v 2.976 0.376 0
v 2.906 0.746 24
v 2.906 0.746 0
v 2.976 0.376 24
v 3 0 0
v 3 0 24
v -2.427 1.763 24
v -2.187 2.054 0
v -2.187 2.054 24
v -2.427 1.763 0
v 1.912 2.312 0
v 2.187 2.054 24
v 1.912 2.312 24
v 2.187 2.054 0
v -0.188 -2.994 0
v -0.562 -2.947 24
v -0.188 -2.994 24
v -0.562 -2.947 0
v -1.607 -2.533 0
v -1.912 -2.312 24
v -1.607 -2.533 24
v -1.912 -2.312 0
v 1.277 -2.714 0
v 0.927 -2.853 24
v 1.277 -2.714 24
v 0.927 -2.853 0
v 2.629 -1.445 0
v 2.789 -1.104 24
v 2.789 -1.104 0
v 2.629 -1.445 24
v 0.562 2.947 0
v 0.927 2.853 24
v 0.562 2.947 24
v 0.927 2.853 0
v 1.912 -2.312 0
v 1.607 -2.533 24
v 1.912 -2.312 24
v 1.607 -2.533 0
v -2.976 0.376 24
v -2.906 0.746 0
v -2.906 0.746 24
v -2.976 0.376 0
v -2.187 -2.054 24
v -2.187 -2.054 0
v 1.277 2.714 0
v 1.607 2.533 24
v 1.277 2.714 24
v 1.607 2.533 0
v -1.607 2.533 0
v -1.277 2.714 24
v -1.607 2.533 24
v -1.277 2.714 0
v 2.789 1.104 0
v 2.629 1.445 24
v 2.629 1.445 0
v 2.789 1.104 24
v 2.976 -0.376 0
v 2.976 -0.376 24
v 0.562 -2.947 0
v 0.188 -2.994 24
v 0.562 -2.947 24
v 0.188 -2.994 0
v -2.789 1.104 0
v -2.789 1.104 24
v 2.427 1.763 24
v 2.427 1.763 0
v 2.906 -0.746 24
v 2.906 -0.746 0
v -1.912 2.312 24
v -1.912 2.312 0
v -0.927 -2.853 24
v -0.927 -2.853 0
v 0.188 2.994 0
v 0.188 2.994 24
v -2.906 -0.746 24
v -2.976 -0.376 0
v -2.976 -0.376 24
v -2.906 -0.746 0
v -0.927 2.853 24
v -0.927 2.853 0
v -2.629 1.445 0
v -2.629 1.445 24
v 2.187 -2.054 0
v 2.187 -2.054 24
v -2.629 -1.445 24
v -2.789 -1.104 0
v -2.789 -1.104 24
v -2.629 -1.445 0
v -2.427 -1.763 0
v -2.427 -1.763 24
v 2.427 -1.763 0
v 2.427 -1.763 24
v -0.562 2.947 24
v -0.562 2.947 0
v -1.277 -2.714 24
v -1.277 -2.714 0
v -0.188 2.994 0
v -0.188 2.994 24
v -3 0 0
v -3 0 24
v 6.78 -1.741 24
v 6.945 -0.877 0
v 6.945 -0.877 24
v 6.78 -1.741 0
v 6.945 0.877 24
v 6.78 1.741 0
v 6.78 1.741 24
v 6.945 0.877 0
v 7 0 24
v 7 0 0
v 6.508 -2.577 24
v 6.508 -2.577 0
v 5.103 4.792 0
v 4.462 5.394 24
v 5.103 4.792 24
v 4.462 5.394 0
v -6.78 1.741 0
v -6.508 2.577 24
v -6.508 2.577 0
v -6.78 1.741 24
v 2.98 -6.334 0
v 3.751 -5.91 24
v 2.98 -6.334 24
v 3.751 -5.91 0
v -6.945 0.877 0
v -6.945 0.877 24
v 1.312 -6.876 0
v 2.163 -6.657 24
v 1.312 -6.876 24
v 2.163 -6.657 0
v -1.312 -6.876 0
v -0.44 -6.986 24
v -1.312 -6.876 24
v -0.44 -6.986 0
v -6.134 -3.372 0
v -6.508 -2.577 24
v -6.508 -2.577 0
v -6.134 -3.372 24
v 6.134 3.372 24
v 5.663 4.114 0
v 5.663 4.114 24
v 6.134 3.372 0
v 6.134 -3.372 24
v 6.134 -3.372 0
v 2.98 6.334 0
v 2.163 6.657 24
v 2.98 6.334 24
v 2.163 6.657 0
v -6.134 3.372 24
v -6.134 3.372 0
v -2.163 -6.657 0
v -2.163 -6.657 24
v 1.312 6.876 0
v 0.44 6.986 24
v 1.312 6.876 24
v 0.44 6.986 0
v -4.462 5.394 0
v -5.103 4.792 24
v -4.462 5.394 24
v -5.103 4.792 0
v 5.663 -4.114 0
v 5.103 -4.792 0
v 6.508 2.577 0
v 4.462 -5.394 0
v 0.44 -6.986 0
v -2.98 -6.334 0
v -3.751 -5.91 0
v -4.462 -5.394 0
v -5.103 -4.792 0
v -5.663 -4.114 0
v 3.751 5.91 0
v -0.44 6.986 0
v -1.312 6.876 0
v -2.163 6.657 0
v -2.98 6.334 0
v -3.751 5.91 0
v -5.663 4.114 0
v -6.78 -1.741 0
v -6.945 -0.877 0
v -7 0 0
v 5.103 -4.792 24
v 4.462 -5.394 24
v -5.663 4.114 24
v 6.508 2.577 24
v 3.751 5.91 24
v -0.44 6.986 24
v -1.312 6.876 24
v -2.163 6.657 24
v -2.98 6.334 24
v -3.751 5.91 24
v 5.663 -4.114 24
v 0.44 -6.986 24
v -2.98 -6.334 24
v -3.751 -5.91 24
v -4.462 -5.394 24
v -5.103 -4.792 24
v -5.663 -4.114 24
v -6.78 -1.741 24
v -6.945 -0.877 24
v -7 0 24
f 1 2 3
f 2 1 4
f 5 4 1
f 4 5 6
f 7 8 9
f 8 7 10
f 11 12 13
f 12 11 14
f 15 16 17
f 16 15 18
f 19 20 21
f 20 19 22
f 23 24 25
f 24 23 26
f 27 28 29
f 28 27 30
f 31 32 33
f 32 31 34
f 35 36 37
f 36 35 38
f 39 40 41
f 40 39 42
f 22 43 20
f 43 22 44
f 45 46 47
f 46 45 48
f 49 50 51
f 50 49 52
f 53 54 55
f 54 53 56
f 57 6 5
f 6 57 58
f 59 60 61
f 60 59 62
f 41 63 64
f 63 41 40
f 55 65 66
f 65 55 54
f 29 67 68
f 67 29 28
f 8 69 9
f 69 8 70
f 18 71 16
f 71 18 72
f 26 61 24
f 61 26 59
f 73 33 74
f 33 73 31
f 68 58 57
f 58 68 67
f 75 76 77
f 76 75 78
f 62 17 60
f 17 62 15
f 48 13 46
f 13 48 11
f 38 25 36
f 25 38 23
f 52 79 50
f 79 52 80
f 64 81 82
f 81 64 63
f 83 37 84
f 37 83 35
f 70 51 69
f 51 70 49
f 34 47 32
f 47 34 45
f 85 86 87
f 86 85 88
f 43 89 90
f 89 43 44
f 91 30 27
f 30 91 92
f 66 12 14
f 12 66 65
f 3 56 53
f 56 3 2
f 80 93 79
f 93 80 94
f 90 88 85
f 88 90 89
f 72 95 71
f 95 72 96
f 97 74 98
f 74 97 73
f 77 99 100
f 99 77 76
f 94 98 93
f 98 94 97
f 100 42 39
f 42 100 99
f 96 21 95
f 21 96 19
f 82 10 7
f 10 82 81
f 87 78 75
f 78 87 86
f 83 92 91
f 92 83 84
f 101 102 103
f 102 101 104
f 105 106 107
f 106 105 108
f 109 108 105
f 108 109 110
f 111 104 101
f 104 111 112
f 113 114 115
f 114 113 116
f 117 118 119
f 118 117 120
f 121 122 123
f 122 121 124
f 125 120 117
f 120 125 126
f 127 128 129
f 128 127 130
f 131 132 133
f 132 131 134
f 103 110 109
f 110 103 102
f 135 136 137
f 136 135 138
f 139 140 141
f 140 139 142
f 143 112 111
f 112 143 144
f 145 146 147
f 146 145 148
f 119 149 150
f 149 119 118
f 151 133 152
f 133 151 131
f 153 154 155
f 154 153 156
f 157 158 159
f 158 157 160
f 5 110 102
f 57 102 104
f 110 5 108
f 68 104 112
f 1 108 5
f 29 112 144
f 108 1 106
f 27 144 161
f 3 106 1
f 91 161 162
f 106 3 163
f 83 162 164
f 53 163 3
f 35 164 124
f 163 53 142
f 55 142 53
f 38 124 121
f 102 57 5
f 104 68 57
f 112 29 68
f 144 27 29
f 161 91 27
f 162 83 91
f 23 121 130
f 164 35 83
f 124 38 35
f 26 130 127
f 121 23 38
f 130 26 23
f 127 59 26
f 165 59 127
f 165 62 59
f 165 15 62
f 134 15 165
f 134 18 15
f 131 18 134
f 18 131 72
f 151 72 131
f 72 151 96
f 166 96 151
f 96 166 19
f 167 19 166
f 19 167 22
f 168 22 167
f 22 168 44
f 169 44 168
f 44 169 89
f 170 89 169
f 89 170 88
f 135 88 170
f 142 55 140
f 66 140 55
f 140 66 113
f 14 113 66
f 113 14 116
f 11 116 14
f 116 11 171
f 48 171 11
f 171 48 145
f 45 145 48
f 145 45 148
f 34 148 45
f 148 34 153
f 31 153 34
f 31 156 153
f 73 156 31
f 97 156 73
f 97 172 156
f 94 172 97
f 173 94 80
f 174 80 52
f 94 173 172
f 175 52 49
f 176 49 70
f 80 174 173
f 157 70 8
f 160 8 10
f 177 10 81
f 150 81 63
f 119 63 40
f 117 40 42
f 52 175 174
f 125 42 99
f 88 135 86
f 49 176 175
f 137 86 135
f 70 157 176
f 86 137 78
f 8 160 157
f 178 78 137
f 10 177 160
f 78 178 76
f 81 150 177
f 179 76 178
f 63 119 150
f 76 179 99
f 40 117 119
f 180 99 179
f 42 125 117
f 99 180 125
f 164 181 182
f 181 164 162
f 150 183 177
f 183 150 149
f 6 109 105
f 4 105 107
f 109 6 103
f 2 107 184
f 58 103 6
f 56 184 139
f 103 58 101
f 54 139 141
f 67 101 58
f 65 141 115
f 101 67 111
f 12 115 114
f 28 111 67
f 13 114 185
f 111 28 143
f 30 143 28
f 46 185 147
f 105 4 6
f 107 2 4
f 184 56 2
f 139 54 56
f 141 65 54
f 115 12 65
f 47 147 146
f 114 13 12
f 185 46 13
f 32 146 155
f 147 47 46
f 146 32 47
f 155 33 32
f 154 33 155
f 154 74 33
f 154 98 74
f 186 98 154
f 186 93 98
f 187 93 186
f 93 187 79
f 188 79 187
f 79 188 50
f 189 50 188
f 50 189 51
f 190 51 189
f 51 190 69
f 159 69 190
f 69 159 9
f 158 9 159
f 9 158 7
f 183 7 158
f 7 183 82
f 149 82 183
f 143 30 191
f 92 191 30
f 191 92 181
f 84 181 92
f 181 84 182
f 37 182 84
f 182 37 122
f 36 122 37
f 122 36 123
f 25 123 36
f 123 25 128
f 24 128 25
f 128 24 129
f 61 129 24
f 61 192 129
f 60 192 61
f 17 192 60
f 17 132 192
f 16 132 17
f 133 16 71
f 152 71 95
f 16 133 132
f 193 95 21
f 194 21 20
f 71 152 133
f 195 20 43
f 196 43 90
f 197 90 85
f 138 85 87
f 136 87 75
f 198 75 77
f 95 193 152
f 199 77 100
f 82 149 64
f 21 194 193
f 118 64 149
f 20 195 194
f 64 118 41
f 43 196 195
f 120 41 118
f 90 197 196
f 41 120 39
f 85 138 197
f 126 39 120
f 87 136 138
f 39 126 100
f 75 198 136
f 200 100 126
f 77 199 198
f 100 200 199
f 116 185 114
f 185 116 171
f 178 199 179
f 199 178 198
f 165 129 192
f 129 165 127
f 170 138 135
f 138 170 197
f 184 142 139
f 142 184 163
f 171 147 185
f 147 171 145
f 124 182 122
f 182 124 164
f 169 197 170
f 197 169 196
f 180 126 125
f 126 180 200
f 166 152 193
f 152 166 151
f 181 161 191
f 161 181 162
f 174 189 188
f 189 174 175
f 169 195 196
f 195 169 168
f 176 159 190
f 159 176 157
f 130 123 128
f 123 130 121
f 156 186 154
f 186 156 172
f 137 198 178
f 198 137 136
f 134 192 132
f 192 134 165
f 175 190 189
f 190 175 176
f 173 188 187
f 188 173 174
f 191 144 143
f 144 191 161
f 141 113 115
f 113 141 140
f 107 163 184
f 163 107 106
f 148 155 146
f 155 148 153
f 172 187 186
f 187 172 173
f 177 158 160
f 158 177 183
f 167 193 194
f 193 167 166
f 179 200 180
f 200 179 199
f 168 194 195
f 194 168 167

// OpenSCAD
$fn = 50;


difference() {
	union() {
		*color(alpha = 1.0000000000, c = "gray") {
			translate(v = [0, 7, 0]) {
				linear_extrude(height = 1) {
					text(font = "Arial:style=Bold", halign = "center", size = 4.5000000000, text = "COMMENT plate main", valign = "center");
				}
			}
		}
		cylinder(h = 24, r = 7.0000000000);
	}
	union() {
		*color(alpha = 1.0000000000, c = "gray") {
			translate(v = [0, 7, 0]) {
				linear_extrude(height = 1) {
					text(font = "Arial:style=Bold", halign = "center", size = 4.5000000000, text = "COMMENT holes main", valign = "center");
				}
			}
		}
		translate(v = [0, 0, -100]) {
			cylinder(h = 200, r = 3.0000000000);
		}
		translate(v = [0, 0, -100]) {
			cylinder(h = 200, r = 1.5000000000);
		}
	}
}
